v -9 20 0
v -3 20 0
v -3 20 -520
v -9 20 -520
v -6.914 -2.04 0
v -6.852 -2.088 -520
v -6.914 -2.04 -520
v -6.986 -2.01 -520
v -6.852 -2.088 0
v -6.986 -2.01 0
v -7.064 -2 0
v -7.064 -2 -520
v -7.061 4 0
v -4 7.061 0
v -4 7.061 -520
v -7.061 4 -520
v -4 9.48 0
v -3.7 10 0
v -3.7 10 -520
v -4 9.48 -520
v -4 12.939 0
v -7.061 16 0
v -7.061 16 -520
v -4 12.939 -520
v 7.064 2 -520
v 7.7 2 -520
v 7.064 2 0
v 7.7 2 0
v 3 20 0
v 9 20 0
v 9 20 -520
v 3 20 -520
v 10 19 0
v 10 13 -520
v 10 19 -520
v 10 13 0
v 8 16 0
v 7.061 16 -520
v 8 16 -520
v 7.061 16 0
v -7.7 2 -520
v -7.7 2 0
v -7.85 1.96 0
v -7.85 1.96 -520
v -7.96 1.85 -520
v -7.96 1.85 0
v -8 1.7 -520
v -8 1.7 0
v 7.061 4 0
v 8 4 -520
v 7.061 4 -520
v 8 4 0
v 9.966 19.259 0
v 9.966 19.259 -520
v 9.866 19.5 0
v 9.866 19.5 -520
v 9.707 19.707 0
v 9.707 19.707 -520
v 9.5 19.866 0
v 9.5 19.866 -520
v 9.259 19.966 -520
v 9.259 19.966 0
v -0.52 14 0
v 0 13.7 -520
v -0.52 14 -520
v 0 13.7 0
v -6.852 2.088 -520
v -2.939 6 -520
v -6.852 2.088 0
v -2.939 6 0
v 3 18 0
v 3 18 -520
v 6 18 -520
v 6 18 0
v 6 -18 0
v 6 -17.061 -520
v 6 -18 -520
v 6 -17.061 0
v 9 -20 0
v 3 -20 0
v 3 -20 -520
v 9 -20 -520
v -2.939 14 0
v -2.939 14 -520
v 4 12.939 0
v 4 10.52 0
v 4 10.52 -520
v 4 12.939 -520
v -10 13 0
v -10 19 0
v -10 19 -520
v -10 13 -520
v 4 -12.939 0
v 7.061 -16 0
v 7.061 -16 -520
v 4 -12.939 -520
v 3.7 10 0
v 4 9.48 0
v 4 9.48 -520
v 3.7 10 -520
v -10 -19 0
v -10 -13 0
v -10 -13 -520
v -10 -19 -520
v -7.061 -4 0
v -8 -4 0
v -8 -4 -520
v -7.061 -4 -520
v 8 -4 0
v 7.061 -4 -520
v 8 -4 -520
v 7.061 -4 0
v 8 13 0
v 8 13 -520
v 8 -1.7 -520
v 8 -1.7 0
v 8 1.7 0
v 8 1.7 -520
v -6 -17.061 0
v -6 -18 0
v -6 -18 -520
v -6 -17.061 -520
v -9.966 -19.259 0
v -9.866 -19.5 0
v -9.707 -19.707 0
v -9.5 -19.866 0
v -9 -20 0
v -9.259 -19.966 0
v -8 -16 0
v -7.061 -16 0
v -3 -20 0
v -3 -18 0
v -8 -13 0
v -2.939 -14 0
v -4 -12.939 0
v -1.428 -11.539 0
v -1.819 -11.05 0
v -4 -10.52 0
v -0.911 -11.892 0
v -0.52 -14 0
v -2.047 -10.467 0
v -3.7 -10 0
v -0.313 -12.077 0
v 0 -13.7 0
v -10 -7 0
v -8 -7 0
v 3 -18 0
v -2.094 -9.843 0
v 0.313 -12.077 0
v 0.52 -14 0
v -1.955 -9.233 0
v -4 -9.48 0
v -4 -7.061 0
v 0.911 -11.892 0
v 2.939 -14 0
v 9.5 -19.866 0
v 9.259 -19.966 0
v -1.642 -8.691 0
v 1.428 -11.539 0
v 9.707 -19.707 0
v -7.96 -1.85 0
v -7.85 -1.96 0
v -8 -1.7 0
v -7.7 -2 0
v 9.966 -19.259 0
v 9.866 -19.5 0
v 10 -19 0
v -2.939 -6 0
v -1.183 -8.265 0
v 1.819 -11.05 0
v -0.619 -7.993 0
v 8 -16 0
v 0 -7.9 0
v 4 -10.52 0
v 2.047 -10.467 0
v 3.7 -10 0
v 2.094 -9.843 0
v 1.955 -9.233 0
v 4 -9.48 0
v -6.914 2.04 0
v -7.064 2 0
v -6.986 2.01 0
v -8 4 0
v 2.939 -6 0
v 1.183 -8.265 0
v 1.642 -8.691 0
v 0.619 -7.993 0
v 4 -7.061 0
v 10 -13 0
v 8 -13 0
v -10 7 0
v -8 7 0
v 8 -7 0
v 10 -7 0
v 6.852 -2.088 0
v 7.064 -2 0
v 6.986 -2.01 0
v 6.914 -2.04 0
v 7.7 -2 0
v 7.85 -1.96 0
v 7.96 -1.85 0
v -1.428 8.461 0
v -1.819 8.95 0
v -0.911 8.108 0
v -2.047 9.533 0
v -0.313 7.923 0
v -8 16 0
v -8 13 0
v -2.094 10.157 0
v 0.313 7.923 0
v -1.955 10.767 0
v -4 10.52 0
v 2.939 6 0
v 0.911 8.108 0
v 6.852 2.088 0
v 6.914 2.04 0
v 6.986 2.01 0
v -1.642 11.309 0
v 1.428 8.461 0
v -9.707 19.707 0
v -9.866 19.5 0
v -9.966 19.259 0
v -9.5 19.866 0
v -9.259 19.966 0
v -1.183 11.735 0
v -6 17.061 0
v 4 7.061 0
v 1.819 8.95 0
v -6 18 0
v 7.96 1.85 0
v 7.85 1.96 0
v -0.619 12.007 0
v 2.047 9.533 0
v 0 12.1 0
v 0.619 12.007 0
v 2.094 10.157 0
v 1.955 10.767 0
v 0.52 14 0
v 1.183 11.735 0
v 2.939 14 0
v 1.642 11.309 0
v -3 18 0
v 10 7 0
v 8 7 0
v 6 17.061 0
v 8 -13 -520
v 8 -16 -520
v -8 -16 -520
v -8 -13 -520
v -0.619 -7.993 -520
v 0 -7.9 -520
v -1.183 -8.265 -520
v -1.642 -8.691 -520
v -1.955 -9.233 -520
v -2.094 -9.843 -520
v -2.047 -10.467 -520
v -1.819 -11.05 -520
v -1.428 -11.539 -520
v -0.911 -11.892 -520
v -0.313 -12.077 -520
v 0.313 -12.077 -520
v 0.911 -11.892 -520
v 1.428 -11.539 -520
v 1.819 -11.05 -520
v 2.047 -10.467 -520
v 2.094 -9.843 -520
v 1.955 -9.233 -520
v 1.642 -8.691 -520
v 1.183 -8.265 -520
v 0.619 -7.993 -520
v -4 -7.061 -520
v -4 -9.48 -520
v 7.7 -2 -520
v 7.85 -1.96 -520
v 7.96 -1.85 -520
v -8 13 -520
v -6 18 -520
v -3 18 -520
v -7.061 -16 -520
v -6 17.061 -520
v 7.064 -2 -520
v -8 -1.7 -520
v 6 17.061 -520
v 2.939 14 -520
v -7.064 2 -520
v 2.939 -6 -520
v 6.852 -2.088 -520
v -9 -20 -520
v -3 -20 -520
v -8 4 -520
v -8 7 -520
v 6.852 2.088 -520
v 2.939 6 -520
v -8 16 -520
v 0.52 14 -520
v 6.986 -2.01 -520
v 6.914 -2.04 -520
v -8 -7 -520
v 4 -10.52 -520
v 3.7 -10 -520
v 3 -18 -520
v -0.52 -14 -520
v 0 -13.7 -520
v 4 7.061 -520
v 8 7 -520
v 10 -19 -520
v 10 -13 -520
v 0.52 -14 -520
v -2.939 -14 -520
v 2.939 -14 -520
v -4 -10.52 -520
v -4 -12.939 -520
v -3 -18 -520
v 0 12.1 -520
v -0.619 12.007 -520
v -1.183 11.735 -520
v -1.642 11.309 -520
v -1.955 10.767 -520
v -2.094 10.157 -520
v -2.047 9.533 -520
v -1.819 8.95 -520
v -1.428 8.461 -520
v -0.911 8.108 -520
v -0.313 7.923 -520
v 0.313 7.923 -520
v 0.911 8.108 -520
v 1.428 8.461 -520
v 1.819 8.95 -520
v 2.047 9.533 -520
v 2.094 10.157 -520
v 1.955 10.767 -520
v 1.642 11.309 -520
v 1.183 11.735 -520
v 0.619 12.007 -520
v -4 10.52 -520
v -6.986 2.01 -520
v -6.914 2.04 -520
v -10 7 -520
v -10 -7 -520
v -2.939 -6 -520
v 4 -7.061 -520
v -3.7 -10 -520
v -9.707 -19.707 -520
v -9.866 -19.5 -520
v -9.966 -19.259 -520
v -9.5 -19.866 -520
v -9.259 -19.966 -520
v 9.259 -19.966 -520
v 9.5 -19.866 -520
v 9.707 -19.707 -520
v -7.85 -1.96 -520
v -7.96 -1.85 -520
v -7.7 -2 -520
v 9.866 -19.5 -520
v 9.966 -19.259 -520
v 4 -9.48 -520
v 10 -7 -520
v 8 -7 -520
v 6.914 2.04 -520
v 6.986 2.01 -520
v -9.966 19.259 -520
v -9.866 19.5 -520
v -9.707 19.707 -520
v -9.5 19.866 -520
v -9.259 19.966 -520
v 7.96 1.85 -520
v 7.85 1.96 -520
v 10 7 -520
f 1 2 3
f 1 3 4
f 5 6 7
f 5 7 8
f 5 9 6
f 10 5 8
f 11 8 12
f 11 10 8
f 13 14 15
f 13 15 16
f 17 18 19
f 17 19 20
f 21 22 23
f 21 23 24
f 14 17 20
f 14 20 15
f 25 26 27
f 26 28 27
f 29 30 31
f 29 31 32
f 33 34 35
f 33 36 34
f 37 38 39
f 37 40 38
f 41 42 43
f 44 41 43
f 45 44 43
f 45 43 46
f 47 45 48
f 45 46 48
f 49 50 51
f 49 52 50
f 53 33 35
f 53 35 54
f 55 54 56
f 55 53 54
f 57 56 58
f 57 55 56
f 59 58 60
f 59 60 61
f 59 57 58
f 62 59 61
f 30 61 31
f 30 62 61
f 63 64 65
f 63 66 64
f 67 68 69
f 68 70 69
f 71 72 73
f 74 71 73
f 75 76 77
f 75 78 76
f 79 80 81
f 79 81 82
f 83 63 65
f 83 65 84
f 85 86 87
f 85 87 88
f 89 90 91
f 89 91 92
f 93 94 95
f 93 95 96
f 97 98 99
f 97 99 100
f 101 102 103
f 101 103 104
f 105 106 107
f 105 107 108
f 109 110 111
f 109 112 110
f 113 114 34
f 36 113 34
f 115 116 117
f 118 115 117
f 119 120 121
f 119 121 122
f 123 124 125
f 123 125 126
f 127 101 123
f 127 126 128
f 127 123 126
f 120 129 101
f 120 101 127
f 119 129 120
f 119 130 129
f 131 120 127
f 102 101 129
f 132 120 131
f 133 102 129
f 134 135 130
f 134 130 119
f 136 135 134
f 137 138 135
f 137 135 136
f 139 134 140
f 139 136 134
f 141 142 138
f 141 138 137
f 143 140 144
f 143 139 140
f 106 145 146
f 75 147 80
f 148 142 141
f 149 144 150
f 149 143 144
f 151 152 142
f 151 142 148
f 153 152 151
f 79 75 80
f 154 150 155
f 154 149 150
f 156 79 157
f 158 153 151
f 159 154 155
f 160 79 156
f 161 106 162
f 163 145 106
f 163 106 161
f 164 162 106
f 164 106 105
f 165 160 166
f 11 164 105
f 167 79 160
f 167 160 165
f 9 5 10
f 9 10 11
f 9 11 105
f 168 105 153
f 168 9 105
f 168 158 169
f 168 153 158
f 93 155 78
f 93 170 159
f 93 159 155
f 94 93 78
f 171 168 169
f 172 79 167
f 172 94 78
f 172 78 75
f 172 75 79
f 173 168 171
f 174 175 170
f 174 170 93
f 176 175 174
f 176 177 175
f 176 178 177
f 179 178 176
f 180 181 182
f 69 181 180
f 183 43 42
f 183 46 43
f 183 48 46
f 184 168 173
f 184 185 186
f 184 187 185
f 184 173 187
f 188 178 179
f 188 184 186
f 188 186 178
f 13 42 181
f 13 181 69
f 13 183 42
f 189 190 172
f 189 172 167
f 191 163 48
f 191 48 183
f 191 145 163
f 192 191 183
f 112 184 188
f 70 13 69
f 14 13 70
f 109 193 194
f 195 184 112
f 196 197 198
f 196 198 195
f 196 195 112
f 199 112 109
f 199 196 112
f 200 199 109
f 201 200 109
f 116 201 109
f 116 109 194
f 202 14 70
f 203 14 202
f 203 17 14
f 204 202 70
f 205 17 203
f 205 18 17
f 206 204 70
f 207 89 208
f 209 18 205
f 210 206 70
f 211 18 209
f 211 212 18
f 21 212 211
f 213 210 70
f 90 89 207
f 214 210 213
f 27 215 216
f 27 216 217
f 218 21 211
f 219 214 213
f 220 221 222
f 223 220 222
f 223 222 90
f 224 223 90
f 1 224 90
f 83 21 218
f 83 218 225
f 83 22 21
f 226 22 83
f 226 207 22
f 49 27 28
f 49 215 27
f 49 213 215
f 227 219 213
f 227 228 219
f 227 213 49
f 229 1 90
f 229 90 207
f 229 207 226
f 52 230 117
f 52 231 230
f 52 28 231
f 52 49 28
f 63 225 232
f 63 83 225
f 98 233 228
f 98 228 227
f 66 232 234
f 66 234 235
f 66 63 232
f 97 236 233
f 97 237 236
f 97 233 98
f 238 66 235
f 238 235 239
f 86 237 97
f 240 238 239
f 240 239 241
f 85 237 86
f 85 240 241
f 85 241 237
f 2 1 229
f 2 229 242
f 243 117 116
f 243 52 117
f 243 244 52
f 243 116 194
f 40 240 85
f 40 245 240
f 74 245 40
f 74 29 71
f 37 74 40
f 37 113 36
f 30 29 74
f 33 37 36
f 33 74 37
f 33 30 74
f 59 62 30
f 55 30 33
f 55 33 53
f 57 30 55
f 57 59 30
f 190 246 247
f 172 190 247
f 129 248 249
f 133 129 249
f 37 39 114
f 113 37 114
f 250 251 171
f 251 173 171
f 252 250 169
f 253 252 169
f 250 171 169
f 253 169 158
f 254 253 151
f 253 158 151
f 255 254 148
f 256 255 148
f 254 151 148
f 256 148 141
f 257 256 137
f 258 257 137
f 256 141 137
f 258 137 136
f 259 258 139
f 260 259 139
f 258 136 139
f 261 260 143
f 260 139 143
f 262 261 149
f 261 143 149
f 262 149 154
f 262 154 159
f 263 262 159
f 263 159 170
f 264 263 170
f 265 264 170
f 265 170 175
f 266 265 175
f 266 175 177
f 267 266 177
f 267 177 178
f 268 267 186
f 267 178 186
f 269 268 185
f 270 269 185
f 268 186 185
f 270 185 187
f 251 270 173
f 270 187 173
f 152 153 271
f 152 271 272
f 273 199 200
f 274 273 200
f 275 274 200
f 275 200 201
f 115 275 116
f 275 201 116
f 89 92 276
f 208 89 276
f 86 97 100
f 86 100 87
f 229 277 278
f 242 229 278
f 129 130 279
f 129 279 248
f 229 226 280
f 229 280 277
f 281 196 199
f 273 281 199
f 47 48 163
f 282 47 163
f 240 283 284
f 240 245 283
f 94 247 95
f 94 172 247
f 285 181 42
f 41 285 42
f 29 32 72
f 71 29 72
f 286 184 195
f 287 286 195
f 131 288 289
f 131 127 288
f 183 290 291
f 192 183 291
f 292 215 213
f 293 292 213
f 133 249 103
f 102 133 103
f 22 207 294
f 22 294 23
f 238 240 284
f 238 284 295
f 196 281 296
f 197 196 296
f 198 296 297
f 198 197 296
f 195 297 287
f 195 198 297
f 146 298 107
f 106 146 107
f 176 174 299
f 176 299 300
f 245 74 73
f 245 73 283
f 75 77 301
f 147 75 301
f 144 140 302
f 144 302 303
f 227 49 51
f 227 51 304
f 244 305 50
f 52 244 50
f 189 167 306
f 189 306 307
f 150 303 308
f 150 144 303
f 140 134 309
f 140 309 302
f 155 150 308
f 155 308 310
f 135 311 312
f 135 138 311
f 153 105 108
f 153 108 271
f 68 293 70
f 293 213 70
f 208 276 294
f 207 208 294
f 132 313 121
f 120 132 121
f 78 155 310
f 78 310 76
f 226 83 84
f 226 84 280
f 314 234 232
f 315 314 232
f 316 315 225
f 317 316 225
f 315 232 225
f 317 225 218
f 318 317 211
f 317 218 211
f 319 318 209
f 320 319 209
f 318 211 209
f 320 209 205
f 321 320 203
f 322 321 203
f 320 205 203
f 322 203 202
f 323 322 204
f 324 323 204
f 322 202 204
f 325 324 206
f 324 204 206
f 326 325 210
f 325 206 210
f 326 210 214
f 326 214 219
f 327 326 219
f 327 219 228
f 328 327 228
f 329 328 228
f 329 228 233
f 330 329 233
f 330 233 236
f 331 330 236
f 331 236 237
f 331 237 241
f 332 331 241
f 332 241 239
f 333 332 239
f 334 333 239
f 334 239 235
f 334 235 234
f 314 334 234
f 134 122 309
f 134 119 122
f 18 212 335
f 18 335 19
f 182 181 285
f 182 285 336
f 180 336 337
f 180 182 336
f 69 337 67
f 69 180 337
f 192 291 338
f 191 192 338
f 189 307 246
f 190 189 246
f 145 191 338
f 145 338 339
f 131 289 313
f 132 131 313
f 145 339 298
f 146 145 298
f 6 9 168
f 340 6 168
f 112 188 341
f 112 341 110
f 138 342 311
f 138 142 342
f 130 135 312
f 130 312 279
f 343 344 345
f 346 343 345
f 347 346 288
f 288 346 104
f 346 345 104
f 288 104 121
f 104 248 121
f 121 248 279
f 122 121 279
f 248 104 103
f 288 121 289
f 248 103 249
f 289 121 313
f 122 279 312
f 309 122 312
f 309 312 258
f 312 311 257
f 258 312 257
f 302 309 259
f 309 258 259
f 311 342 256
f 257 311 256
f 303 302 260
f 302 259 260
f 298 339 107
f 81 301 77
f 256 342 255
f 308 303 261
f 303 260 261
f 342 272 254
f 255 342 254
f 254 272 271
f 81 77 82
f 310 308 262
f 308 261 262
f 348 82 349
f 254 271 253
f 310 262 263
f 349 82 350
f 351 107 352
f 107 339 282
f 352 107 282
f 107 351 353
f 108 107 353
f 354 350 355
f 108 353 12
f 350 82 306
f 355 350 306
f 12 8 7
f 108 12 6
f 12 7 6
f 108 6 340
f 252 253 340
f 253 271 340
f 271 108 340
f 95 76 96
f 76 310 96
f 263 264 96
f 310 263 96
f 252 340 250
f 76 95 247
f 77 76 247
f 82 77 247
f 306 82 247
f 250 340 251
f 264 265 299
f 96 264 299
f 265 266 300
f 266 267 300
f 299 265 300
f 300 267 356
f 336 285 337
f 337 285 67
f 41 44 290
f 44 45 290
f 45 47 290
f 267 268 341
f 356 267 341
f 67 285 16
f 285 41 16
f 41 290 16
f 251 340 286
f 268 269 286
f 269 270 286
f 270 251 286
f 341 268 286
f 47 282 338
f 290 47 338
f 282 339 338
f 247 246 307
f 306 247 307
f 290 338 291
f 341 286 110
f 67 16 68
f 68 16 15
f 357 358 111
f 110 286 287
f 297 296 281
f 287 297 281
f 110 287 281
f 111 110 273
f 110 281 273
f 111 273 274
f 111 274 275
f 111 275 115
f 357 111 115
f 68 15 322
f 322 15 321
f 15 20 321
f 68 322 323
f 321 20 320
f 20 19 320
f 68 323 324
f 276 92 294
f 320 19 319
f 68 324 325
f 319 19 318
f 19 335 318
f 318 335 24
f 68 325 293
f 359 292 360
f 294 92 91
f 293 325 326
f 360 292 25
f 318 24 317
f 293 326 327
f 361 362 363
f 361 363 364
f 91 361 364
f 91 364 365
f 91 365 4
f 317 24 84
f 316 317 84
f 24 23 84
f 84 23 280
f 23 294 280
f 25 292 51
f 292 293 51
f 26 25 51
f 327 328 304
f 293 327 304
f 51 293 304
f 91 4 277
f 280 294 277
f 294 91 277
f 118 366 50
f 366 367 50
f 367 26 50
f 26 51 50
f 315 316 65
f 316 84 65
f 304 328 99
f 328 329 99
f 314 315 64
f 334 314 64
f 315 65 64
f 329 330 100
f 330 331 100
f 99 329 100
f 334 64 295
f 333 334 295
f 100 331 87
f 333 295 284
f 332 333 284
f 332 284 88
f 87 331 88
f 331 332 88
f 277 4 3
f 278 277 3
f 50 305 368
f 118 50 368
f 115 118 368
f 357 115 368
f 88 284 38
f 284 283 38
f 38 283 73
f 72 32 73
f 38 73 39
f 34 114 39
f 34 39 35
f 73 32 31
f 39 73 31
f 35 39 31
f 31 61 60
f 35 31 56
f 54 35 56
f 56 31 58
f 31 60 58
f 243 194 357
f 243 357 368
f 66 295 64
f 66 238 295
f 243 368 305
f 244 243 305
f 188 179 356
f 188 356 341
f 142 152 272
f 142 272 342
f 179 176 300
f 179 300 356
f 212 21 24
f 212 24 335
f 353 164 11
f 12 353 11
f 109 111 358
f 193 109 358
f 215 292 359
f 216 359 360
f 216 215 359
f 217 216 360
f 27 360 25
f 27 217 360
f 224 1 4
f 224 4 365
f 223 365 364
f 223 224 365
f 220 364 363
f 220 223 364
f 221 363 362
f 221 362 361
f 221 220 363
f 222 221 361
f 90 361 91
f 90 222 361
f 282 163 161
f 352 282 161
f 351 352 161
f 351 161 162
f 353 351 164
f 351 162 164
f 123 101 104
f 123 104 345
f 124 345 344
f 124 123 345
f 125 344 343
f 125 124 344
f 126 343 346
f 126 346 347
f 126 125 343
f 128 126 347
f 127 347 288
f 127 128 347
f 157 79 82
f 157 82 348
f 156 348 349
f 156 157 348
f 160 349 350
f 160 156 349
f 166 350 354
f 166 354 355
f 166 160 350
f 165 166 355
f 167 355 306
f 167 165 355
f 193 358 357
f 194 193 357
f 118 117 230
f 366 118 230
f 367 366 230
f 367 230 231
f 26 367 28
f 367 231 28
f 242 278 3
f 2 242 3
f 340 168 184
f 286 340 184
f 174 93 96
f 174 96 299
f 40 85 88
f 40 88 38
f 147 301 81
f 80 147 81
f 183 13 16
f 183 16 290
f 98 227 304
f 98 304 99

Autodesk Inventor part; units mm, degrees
sketch "Sketch_1" plane through (0, 0, 0) normal (0, 0, 1) x (1, 0, 0)
  line L0 (-10, -7) -> (-8, -7)
  line L1 (-8, -7) -> (-8, -4)
  line L2 (-8, -4) -> (-7.0607, -4)
  line L3 (-7.0607, -4) -> (-4, -7.0607)
  line L4 (-4, -7.0607) -> (-4, -9.4804)
  line L5 (-4, -9.4804) -> (-3.7, -10)
  line L6 (-3.7, -10) -> (-4, -10.5196)
  line L7 (-4, -10.5196) -> (-4, -12.9393)
  line L8 (-4, -12.9393) -> (-7.0607, -16)
  line L9 (-7.0607, -16) -> (-8, -16)
  line L10 (-8, -16) -> (-8, -13)
  line L11 (-8, -13) -> (-10, -13)
  line L12 (-10, -13) -> (-10, -19)
  arc A0 (-10, -19) -> (-9, -20) centre (-9, -19) ccw
  line L13 (-9, -20) -> (-3, -20)
  line L14 (-3, -20) -> (-3, -18)
  line L15 (-3, -18) -> (-6, -18)
  line L16 (-6, -18) -> (-6, -17.0607)
  line L17 (-6, -17.0607) -> (-2.9393, -14)
  line L18 (-2.9393, -14) -> (-0.5196, -14)
  line L19 (-0.5196, -14) -> (0, -13.7)
  line L20 (0, -13.7) -> (0.5196, -14)
  line L21 (0.5196, -14) -> (2.9393, -14)
  line L22 (2.9393, -14) -> (6, -17.0607)
  line L23 (6, -17.0607) -> (6, -18)
  line L24 (6, -18) -> (3, -18)
  line L25 (3, -18) -> (3, -20)
  line L26 (3, -20) -> (9, -20)
  arc A1 (9, -20) -> (10, -19) centre (9, -19) ccw
  line L27 (10, -19) -> (10, -13)
  line L28 (10, -13) -> (8, -13)
  line L29 (8, -13) -> (8, -16)
  line L30 (8, -16) -> (7.0607, -16)
  line L31 (7.0607, -16) -> (4, -12.9393)
  line L32 (4, -12.9393) -> (4, -10.5196)
  line L33 (4, -10.5196) -> (3.7, -10)
  line L34 (3.7, -10) -> (4, -9.4804)
  line L35 (4, -9.4804) -> (4, -7.0607)
  line L36 (4, -7.0607) -> (7.0607, -4)
  line L37 (7.0607, -4) -> (8, -4)
  line L38 (8, -4) -> (8, -7)
  line L39 (8, -7) -> (10, -7)
  line L40 (10, -7) -> (10, 7)
  line L41 (10, 7) -> (8, 7)
  line L42 (8, 7) -> (8, 4)
  line L43 (8, 4) -> (7.0607, 4)
  line L44 (7.0607, 4) -> (4, 7.0607)
  line L45 (4, 7.0607) -> (4, 9.4804)
  line L46 (4, 9.4804) -> (3.7, 10)
  line L47 (3.7, 10) -> (4, 10.5196)
  line L48 (4, 10.5196) -> (4, 12.9393)
  line L49 (4, 12.9393) -> (7.0607, 16)
  line L50 (7.0607, 16) -> (8, 16)
  line L51 (8, 16) -> (8, 13)
  line L52 (8, 13) -> (10, 13)
  line L53 (10, 13) -> (10, 19)
  arc A2 (10, 19) -> (9, 20) centre (9, 19) ccw
  line L54 (9, 20) -> (3, 20)
  line L55 (3, 20) -> (3, 18)
  line L56 (3, 18) -> (6, 18)
  line L57 (6, 18) -> (6, 17.0607)
  line L58 (6, 17.0607) -> (2.9393, 14)
  line L59 (2.9393, 14) -> (0.5196, 14)
  line L60 (0.5196, 14) -> (0, 13.7)
  line L61 (0, 13.7) -> (-0.5196, 14)
  line L62 (-0.5196, 14) -> (-2.9393, 14)
  line L63 (-2.9393, 14) -> (-6, 17.0607)
  line L64 (-6, 17.0607) -> (-6, 18)
  line L65 (-6, 18) -> (-3, 18)
  line L66 (-3, 18) -> (-3, 20)
  line L67 (-3, 20) -> (-9, 20)
  arc A3 (-9, 20) -> (-10, 19) centre (-9, 19) ccw
  line L68 (-10, 19) -> (-10, 13)
  line L69 (-10, 13) -> (-8, 13)
  line L70 (-8, 13) -> (-8, 16)
  line L71 (-8, 16) -> (-7.0607, 16)
  line L72 (-7.0607, 16) -> (-4, 12.9393)
  line L73 (-4, 12.9393) -> (-4, 10.5196)
  line L74 (-4, 10.5196) -> (-3.7, 10)
  line L75 (-3.7, 10) -> (-4, 9.4804)
  line L76 (-4, 9.4804) -> (-4, 7.0607)
  line L77 (-4, 7.0607) -> (-7.0607, 4)
  line L78 (-7.0607, 4) -> (-8, 4)
  line L79 (-8, 4) -> (-8, 7)
  line L80 (-8, 7) -> (-10, 7)
  line L81 (-10, 7) -> (-10, -7)
  line L82 (-8, 1.7) -> (-8, -1.7)
  arc A4 (-8, -1.7) -> (-7.7, -2) centre (-7.7, -1.7) ccw
  line L83 (-7.7, -2) -> (-7.0636, -2)
  arc A5 (-6.8515, -2.0879) -> (-7.0636, -2) centre (-7.0636, -2.3) ccw
  line L84 (-6.8515, -2.0879) -> (-2.9393, -6)
  line L85 (-2.9393, -6) -> (2.9393, -6)
  line L86 (2.9393, -6) -> (6.8515, -2.0879)
  arc A6 (7.0636, -2) -> (6.8515, -2.0879) centre (7.0636, -2.3) ccw
  line L87 (7.0636, -2) -> (7.7, -2)
  arc A7 (7.7, -2) -> (8, -1.7) centre (7.7, -1.7) ccw
  line L88 (8, -1.7) -> (8, 1.7)
  arc A8 (8, 1.7) -> (7.7, 2) centre (7.7, 1.7) ccw
  line L89 (7.7, 2) -> (7.0636, 2)
  arc A9 (6.8515, 2.0879) -> (7.0636, 2) centre (7.0636, 2.3) ccw
  line L90 (6.8515, 2.0879) -> (2.9393, 6)
  line L91 (2.9393, 6) -> (-2.9393, 6)
  line L92 (-2.9393, 6) -> (-6.8515, 2.0879)
  arc A10 (-7.0636, 2) -> (-6.8515, 2.0879) centre (-7.0636, 2.3) ccw
  line L93 (-7.0636, 2) -> (-7.7, 2)
  arc A11 (-7.7, 2) -> (-8, 1.7) centre (-7.7, 1.7) ccw
extrude "Extrusion1" add sketch "Sketch_1" against normal blind 520
sketch "Sketch2" plane through (0, 0, -520) normal (0, 0, -1) x (-1, 0, 0)
  point P0 (0, 10)
hole "Hole1" at (0, 10, -520) direction (0, 0, 1) diameter 4.2 depth 520
pattern_linear "Rectangular Pattern1" count 2 spacing 20 along (0, -1, 0) of "Hole1"
ref_plane "C1_XY" through (0, 0, 0) normal (0, 0, 1) x (1, 0, 0)
ref_plane "C1_YZ" through (0, 0, 0) normal (1, 0, 0) x (0, 1, 0)
ref_plane "C1_ZX" through (0, 0, 0) normal (0, 1, 0) x (0, 0, 1)
properties part number "HFS5-2040-520"
